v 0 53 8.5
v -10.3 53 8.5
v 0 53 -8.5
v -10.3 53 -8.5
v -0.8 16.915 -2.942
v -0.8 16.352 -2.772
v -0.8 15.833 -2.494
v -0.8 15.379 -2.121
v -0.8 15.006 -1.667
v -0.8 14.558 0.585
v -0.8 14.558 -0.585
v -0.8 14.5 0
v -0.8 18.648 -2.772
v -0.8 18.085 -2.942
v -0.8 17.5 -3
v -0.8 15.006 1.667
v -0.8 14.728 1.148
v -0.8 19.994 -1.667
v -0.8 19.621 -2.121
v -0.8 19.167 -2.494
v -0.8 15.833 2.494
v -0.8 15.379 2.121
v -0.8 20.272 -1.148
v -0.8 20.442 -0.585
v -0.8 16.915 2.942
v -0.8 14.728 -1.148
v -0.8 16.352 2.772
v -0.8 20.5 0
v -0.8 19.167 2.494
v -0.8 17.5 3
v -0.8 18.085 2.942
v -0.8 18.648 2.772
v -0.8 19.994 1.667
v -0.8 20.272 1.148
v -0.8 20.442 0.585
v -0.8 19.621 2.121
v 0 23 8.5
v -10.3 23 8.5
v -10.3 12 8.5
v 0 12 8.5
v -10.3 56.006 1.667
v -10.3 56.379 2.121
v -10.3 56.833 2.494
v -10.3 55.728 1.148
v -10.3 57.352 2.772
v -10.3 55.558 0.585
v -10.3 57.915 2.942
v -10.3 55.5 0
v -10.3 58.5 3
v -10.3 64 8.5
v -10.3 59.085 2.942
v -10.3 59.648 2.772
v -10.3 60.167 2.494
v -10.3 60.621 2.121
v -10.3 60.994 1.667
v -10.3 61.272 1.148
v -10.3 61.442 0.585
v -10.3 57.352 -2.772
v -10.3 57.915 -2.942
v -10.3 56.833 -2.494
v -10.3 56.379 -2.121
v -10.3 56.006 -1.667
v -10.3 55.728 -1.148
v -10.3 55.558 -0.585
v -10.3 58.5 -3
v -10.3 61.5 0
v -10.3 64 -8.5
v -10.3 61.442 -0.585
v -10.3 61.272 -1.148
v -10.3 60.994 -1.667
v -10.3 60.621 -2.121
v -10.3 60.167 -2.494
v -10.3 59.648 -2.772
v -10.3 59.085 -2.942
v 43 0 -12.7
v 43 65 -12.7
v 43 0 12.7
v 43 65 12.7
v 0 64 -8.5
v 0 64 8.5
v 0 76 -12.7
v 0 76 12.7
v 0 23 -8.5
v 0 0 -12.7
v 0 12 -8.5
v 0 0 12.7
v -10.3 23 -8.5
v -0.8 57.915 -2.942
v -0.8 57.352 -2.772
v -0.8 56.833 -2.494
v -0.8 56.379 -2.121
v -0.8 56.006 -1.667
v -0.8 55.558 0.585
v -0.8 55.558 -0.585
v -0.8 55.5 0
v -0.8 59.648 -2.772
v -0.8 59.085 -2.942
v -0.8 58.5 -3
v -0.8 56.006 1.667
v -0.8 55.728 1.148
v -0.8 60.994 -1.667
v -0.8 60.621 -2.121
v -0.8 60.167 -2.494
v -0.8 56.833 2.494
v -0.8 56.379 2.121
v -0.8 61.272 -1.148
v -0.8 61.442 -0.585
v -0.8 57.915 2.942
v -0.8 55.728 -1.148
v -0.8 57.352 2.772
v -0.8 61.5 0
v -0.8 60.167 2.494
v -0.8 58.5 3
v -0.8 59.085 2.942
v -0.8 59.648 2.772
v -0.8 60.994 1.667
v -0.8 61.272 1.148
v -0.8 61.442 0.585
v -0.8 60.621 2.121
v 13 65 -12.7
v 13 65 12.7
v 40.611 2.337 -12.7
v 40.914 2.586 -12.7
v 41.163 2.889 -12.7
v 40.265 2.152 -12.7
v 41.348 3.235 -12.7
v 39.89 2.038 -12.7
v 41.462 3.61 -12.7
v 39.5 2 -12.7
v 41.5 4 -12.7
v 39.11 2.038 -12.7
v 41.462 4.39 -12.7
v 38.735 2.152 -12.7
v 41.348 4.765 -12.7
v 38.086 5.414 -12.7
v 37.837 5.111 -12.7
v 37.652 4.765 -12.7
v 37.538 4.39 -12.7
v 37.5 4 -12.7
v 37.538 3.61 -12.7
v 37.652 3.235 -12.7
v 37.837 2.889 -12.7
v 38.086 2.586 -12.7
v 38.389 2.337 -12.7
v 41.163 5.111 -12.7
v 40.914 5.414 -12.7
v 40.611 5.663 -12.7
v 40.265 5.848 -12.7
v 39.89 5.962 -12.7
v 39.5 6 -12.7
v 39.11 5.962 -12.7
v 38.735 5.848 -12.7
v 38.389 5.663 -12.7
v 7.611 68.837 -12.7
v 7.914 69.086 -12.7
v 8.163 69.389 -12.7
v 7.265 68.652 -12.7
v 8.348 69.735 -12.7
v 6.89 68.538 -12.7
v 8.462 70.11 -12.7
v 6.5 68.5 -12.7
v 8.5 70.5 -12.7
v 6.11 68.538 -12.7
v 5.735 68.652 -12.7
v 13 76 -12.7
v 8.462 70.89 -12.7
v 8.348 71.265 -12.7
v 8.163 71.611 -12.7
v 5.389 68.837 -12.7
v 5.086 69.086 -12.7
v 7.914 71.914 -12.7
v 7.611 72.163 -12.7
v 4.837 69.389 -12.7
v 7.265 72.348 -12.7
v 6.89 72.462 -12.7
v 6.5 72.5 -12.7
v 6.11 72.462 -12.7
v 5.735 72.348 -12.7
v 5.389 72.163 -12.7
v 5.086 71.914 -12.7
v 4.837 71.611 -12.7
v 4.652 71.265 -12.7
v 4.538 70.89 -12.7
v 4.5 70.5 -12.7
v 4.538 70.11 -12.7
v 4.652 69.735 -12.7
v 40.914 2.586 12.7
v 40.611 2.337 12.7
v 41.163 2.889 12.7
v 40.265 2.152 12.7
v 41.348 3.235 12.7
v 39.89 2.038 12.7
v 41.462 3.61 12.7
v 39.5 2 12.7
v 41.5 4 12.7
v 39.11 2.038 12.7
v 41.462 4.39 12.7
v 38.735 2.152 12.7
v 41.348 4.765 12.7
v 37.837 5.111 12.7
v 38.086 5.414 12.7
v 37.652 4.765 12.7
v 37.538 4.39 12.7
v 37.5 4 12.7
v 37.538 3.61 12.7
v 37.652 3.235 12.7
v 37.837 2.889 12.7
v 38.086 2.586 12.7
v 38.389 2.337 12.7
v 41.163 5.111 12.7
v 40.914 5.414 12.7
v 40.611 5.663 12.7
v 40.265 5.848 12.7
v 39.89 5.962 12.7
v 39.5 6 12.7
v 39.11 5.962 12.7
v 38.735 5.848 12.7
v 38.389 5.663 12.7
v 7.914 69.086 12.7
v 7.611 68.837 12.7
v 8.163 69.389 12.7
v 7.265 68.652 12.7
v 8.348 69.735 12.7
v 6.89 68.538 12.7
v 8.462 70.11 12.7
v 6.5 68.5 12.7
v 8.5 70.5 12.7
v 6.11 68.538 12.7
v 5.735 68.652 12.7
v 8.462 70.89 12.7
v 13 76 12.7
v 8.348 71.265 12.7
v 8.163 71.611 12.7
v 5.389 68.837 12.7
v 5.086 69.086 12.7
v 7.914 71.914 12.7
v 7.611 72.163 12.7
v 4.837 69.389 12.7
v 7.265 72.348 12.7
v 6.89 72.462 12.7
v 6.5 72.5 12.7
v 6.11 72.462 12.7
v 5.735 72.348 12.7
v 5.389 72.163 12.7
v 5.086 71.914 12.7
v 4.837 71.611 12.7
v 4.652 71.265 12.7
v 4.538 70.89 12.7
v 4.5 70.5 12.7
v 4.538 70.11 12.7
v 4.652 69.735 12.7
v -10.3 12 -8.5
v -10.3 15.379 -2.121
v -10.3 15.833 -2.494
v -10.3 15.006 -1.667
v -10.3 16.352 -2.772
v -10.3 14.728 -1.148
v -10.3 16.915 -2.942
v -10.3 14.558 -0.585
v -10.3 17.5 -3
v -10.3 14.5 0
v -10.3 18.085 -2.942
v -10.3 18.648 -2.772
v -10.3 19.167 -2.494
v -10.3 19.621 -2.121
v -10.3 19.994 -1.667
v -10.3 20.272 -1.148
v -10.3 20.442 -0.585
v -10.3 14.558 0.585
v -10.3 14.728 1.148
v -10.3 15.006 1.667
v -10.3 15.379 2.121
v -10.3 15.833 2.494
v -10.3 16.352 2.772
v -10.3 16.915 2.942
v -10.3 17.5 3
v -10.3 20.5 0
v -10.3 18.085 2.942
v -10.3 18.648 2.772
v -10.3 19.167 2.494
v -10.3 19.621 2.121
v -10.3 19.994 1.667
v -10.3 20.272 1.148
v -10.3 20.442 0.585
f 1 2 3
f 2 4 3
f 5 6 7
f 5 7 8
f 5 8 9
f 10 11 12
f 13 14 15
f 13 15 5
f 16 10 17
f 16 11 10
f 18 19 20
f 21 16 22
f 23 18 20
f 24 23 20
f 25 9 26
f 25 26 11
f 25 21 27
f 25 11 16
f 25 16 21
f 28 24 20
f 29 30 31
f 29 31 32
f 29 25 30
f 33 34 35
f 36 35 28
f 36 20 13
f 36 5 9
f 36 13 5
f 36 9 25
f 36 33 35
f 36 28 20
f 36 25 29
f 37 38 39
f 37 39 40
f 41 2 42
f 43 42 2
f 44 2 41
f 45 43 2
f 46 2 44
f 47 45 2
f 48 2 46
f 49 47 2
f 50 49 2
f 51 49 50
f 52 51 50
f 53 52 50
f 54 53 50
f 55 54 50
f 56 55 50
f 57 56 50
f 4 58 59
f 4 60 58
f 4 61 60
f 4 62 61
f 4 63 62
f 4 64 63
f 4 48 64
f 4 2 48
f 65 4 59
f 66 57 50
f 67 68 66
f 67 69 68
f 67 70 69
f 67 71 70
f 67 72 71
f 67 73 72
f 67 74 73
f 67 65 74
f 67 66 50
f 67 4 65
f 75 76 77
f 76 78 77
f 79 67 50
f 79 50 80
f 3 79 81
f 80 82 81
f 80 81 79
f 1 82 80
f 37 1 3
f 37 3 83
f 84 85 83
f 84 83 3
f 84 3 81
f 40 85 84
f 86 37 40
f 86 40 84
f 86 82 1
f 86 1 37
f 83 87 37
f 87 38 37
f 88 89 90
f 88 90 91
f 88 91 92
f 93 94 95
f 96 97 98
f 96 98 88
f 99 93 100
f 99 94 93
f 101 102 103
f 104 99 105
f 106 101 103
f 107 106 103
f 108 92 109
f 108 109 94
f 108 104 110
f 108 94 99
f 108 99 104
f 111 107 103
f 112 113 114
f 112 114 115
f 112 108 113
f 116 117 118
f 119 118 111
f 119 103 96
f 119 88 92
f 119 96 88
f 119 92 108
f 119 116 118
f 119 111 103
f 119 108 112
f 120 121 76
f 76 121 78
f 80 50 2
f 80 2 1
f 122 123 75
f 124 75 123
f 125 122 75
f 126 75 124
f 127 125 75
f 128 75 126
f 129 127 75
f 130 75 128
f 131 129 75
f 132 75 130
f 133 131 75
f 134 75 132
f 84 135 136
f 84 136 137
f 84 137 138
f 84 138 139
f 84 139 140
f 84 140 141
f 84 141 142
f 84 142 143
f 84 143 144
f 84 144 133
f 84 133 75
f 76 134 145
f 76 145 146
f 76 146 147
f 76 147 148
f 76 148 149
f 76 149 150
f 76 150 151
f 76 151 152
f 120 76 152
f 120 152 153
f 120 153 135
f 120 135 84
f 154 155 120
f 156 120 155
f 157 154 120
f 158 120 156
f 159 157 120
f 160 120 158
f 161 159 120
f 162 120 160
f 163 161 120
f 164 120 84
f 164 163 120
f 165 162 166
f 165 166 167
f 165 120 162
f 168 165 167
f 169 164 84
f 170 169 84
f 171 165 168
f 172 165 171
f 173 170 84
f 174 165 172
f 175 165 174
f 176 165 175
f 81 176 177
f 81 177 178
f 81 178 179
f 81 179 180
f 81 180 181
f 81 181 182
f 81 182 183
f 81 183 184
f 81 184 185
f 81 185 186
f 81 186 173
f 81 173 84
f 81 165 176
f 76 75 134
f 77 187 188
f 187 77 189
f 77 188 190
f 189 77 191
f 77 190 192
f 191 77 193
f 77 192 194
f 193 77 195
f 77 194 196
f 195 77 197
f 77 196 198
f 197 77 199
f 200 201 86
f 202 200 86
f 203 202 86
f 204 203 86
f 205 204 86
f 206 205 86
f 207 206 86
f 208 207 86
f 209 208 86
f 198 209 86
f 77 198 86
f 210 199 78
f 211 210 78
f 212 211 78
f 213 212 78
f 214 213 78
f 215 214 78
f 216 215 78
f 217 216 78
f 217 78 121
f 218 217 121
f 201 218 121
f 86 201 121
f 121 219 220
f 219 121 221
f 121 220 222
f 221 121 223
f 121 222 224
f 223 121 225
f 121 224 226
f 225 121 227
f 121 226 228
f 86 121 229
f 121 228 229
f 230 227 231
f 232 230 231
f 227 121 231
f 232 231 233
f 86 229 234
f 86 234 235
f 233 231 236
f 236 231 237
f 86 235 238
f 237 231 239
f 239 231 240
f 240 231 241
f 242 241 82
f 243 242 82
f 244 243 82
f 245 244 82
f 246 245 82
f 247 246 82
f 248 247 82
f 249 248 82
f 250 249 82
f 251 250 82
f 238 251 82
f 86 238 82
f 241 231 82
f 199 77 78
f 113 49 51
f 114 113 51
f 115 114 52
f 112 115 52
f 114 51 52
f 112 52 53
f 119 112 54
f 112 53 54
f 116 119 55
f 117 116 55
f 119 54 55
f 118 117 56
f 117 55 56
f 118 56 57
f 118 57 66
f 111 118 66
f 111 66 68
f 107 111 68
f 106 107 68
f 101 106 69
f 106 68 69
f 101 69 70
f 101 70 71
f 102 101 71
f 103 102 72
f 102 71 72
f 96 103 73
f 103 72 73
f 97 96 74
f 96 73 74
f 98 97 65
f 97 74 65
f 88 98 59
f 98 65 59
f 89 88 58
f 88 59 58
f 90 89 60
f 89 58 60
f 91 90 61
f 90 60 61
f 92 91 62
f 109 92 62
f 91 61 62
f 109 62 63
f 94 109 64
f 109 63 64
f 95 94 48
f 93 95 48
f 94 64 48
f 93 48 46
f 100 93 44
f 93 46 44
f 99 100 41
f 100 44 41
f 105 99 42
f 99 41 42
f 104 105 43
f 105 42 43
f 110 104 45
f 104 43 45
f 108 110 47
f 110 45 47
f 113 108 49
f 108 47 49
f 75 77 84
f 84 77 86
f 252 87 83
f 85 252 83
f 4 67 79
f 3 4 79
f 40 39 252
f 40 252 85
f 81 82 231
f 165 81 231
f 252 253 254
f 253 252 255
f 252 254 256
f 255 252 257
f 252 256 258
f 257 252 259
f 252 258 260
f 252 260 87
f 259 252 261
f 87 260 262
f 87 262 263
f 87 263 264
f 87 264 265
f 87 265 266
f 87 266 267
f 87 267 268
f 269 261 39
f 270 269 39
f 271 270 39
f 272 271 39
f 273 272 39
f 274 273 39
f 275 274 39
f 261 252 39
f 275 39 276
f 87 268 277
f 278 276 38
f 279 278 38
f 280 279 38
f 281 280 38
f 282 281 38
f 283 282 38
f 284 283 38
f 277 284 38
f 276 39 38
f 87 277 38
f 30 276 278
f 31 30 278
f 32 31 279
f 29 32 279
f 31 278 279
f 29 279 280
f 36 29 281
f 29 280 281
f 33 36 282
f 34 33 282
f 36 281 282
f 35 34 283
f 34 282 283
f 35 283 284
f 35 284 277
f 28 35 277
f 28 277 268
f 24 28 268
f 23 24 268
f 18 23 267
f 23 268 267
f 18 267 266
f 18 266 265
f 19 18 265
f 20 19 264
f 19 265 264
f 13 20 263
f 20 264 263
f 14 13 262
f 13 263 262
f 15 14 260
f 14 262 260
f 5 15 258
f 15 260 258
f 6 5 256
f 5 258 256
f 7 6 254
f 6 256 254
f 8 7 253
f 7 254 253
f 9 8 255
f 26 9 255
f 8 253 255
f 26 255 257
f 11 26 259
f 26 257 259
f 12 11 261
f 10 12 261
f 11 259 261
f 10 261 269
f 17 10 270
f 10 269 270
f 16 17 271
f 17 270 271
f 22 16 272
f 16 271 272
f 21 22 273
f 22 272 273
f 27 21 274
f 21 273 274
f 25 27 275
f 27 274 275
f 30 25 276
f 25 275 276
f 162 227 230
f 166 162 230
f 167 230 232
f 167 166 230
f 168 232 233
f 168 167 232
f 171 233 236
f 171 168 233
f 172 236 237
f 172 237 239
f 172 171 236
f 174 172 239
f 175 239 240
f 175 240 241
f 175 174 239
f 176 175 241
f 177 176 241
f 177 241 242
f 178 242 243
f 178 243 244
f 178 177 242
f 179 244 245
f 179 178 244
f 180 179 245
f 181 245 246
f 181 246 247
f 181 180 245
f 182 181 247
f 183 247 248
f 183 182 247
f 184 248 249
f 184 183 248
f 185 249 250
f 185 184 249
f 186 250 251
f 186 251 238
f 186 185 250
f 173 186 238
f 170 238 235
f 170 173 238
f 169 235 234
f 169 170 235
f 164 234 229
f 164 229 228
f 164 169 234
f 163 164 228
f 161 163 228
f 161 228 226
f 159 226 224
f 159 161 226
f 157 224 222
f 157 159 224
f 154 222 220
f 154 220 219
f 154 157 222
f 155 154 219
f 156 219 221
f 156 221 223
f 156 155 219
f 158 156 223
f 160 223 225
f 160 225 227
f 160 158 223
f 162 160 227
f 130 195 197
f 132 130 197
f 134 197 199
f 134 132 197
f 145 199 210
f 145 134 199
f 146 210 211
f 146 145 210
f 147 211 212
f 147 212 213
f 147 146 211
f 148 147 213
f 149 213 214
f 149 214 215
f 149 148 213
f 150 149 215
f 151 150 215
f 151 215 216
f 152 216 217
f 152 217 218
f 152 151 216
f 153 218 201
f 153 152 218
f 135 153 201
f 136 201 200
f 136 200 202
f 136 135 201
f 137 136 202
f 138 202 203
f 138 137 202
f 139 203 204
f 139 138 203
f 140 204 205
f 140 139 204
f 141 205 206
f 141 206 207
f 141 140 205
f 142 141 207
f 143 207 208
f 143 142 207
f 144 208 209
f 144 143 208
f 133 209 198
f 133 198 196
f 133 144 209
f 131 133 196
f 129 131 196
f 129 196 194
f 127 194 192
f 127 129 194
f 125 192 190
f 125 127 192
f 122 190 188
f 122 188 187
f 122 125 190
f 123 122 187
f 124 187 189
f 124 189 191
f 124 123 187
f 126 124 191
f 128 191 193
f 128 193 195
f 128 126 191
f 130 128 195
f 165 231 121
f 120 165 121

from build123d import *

# Parameters (mm, degrees)
CROQUIS1_R              = 2
SALIENTE_EXTRUIR1_DEPTH = 12.7
CROQUIS2_W              = 10.3
CROQUIS2_H              = 11
SALIENTE_EXTRUIR2_DEPTH = 8.5
CROQUIS3_R              = 3
CORTAR_EXTRUIR1_DEPTH   = 9.5


with BuildPart() as part:
    # Croquis1 → Saliente-Extruir1 (new body, symmetric)
    with BuildSketch(Plane.XY):
        Polygon((13, 65), (43, 65), (43, 0), (0, 0), (0, 65), (0, 76), (13, 76), align=None)
        with Locations((39.5, 4)):
            Circle(CROQUIS1_R, mode=Mode.SUBTRACT)
        with Locations((6.5, 70.5)):
            Circle(CROQUIS1_R, mode=Mode.SUBTRACT)
    extrude(amount=SALIENTE_EXTRUIR1_DEPTH, both=True)

    # Croquis2 → Saliente-Extruir2 (add, symmetric)
    with BuildSketch(Plane.XY):
        with Locations((-5.15, 58.5)):
            Rectangle(CROQUIS2_W, CROQUIS2_H)
        with Locations((-5.15, 17.5)):
            Rectangle(CROQUIS2_W, CROQUIS2_H)
    extrude(amount=SALIENTE_EXTRUIR2_DEPTH, both=True)

    # Croquis3 → Cortar-Extruir1 (cut)
    with BuildSketch(Plane.ZY.offset(10.3)):
        with Locations((0, 58.5)):
            Circle(CROQUIS3_R)
        with Locations((0, 17.5)):
            Circle(CROQUIS3_R)
    extrude(amount=-CORTAR_EXTRUIR1_DEPTH, mode=Mode.SUBTRACT)


solid = part.part
